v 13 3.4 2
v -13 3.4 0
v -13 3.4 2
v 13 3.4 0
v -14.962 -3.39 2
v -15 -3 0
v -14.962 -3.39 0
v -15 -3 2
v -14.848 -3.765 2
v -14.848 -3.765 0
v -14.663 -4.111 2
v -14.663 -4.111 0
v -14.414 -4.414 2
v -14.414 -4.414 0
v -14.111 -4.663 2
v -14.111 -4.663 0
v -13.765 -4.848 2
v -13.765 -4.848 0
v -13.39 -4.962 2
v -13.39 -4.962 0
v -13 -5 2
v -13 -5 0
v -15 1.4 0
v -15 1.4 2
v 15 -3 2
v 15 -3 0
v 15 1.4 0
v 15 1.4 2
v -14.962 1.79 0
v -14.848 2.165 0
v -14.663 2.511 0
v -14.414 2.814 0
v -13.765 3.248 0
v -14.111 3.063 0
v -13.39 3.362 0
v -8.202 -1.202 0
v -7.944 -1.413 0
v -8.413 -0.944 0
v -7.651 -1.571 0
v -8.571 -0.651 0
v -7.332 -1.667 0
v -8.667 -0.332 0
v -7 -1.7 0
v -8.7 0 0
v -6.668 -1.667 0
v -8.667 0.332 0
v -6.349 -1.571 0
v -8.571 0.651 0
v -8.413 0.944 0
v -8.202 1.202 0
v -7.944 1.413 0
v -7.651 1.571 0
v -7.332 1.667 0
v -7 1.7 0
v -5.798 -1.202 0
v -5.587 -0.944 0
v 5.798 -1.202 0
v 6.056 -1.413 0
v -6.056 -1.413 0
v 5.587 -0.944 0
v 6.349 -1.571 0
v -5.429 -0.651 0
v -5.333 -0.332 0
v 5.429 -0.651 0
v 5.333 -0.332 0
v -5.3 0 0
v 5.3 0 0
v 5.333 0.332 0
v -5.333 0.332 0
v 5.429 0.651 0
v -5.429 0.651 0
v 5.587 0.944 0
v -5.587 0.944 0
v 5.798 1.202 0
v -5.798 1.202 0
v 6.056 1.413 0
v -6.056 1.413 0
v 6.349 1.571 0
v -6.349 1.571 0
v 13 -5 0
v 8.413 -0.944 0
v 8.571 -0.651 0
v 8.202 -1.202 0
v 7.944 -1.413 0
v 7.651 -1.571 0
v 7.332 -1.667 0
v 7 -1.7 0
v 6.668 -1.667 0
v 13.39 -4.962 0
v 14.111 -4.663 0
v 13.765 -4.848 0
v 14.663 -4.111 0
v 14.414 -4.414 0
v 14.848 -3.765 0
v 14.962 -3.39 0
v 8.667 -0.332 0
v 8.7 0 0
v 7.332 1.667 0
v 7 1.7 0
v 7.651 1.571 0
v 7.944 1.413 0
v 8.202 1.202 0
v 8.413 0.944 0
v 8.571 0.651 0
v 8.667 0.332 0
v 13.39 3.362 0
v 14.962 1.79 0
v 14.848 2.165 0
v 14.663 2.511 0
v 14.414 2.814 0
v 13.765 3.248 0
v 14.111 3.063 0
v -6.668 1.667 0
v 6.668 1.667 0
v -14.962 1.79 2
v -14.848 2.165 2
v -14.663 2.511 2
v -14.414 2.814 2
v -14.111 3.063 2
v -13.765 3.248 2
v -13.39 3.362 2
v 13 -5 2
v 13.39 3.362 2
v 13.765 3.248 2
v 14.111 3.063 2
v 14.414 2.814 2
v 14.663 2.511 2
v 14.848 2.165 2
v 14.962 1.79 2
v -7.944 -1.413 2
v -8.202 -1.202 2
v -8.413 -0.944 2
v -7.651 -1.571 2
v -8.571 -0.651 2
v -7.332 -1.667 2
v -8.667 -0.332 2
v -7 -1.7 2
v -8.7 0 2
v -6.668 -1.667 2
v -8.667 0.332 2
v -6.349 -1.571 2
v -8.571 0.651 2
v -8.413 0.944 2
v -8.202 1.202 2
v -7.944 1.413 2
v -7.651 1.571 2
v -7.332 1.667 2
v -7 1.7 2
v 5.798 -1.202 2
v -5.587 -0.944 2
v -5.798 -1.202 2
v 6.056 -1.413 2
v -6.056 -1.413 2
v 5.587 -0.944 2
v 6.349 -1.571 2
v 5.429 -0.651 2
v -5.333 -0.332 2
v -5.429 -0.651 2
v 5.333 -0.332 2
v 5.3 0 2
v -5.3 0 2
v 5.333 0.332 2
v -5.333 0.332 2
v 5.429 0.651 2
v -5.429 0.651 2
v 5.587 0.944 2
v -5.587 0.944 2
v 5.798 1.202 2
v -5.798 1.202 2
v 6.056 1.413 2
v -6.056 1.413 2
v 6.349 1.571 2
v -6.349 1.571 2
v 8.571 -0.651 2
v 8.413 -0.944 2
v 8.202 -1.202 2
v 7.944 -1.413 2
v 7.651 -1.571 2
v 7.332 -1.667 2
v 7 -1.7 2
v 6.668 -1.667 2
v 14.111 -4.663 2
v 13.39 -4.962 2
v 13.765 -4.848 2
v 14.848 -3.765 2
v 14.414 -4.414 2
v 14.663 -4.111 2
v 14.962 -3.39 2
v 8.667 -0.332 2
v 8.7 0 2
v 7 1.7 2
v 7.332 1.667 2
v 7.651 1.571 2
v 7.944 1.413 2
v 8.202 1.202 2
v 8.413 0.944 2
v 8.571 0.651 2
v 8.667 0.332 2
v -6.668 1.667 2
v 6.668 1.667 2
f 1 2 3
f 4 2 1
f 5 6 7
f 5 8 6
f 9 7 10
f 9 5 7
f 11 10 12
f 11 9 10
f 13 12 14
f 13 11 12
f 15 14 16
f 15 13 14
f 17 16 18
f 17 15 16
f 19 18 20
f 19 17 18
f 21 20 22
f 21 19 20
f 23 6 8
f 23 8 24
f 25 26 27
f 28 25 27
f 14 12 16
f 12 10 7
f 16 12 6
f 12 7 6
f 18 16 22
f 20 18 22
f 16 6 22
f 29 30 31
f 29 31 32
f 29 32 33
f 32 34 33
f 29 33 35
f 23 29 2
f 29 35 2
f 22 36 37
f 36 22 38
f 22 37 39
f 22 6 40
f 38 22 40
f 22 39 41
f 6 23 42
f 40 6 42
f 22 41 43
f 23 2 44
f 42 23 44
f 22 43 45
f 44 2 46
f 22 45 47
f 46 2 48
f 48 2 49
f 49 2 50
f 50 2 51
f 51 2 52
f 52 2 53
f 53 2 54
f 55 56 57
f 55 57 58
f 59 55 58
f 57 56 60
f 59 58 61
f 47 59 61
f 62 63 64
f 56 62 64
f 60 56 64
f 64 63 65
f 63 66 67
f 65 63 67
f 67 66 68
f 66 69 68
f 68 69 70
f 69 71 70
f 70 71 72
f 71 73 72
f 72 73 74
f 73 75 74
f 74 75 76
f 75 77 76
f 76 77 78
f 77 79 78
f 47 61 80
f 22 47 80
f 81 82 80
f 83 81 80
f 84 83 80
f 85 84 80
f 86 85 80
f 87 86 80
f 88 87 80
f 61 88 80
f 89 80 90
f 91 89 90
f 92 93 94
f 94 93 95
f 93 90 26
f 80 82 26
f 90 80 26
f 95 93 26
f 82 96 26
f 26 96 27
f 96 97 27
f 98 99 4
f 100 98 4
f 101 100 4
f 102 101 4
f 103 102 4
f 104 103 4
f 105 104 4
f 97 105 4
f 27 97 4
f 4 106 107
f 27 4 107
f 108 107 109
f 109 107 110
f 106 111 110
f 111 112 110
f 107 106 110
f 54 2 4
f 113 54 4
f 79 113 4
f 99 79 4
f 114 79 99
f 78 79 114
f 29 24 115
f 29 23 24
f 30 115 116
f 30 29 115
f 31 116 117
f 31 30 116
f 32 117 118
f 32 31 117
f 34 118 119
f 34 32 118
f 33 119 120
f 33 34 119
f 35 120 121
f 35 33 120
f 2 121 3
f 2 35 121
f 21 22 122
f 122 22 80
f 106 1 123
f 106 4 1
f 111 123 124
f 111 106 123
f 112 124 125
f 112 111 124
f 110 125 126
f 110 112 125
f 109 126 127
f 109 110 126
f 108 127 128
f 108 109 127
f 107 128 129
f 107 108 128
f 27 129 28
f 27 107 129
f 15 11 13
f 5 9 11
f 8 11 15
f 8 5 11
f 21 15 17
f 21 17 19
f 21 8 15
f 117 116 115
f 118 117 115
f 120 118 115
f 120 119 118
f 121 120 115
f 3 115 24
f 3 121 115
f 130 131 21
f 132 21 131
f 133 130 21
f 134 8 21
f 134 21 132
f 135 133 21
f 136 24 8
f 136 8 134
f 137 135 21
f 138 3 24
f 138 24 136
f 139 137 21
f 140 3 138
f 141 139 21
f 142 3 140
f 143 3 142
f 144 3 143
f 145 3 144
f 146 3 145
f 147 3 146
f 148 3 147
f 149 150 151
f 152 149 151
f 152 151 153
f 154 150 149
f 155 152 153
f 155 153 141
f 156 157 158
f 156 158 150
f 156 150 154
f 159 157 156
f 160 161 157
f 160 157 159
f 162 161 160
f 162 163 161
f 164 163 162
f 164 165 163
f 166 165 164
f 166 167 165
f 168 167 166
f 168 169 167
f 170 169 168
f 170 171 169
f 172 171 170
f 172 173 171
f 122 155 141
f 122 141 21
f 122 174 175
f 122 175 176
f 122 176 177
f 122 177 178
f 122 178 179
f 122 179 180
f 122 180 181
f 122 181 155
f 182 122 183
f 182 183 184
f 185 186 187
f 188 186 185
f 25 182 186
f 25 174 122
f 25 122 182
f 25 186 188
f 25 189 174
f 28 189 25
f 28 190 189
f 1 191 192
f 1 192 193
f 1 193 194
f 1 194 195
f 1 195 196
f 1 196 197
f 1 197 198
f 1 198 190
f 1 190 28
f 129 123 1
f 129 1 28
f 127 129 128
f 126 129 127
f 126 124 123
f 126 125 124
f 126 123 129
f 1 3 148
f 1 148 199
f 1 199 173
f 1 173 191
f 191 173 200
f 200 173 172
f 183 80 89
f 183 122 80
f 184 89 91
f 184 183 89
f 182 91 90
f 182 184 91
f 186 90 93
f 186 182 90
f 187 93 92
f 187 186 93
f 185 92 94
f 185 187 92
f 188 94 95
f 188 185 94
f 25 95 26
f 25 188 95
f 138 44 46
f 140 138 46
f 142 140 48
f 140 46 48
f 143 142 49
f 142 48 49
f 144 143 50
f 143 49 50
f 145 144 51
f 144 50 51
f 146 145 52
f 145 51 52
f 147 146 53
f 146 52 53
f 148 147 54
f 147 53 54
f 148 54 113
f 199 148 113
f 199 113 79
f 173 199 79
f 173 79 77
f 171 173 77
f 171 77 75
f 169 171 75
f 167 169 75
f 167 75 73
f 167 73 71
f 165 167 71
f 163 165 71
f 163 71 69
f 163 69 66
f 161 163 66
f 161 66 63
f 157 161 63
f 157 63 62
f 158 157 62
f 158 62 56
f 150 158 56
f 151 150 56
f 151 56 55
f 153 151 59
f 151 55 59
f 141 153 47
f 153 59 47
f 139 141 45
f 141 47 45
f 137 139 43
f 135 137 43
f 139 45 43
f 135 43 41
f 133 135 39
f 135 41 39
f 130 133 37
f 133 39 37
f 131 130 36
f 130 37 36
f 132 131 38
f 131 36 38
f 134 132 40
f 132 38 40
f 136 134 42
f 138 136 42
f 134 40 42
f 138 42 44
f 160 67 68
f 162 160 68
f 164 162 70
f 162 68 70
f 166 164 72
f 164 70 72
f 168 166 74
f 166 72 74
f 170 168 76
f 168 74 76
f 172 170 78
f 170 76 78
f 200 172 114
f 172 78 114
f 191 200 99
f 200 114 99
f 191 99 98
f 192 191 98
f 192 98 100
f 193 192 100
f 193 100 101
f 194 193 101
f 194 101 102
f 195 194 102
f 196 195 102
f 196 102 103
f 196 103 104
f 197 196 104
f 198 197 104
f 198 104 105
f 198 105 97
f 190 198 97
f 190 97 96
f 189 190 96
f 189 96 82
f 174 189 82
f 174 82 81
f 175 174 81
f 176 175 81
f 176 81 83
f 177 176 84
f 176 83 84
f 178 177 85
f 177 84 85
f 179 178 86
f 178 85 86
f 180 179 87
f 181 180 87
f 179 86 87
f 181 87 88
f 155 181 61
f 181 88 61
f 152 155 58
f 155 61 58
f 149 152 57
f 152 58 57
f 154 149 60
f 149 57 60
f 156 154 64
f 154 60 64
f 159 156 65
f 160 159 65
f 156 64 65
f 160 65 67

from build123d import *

# Parameters (mm, degrees)
SKETCH1_W            = 30
SKETCH1_H            = 10
BOSS_EXTRUDE1_DEPTH  = 2
M3_CLEARANCE_HOLE1_D = 3.4
SKETCH5_W            = 30
SKETCH5_H            = 2
CUT_EXTRUDE1_DEPTH   = 1.6
FILLET1_R            = 2


with BuildPart() as part:
    # Sketch1 → Boss-Extrude1 (new body)
    with BuildSketch(Plane.XY):
        Rectangle(SKETCH1_W, SKETCH1_H)
    extrude(amount=BOSS_EXTRUDE1_DEPTH)

    # M3 Clearance Hole1 (through all)
    with Locations(Plane.XY.offset(2)):
        with Locations((-7, 0), (7, 0)):
            Hole(M3_CLEARANCE_HOLE1_D / 2)

    # Sketch5 → Cut-Extrude1 (cut)
    with BuildSketch(Plane(origin=(0, 5, 0), x_dir=(1, 0, 0), z_dir=(0, 1, 0))):
        with Locations((0, -1)):
            Rectangle(SKETCH5_W, SKETCH5_H)
    extrude(amount=-CUT_EXTRUDE1_DEPTH, mode=Mode.SUBTRACT)

    # Fillet1
    fillet1_edges = [part.edges().sort_by_distance(p)[0] for p in [
        (15, 3.4, 1),
        (-15, 3.4, 1),
        (15, -5, 1),
        (-15, -5, 1),
    ]]
    fillet(fillet1_edges, radius=FILLET1_R)


solid = part.part
